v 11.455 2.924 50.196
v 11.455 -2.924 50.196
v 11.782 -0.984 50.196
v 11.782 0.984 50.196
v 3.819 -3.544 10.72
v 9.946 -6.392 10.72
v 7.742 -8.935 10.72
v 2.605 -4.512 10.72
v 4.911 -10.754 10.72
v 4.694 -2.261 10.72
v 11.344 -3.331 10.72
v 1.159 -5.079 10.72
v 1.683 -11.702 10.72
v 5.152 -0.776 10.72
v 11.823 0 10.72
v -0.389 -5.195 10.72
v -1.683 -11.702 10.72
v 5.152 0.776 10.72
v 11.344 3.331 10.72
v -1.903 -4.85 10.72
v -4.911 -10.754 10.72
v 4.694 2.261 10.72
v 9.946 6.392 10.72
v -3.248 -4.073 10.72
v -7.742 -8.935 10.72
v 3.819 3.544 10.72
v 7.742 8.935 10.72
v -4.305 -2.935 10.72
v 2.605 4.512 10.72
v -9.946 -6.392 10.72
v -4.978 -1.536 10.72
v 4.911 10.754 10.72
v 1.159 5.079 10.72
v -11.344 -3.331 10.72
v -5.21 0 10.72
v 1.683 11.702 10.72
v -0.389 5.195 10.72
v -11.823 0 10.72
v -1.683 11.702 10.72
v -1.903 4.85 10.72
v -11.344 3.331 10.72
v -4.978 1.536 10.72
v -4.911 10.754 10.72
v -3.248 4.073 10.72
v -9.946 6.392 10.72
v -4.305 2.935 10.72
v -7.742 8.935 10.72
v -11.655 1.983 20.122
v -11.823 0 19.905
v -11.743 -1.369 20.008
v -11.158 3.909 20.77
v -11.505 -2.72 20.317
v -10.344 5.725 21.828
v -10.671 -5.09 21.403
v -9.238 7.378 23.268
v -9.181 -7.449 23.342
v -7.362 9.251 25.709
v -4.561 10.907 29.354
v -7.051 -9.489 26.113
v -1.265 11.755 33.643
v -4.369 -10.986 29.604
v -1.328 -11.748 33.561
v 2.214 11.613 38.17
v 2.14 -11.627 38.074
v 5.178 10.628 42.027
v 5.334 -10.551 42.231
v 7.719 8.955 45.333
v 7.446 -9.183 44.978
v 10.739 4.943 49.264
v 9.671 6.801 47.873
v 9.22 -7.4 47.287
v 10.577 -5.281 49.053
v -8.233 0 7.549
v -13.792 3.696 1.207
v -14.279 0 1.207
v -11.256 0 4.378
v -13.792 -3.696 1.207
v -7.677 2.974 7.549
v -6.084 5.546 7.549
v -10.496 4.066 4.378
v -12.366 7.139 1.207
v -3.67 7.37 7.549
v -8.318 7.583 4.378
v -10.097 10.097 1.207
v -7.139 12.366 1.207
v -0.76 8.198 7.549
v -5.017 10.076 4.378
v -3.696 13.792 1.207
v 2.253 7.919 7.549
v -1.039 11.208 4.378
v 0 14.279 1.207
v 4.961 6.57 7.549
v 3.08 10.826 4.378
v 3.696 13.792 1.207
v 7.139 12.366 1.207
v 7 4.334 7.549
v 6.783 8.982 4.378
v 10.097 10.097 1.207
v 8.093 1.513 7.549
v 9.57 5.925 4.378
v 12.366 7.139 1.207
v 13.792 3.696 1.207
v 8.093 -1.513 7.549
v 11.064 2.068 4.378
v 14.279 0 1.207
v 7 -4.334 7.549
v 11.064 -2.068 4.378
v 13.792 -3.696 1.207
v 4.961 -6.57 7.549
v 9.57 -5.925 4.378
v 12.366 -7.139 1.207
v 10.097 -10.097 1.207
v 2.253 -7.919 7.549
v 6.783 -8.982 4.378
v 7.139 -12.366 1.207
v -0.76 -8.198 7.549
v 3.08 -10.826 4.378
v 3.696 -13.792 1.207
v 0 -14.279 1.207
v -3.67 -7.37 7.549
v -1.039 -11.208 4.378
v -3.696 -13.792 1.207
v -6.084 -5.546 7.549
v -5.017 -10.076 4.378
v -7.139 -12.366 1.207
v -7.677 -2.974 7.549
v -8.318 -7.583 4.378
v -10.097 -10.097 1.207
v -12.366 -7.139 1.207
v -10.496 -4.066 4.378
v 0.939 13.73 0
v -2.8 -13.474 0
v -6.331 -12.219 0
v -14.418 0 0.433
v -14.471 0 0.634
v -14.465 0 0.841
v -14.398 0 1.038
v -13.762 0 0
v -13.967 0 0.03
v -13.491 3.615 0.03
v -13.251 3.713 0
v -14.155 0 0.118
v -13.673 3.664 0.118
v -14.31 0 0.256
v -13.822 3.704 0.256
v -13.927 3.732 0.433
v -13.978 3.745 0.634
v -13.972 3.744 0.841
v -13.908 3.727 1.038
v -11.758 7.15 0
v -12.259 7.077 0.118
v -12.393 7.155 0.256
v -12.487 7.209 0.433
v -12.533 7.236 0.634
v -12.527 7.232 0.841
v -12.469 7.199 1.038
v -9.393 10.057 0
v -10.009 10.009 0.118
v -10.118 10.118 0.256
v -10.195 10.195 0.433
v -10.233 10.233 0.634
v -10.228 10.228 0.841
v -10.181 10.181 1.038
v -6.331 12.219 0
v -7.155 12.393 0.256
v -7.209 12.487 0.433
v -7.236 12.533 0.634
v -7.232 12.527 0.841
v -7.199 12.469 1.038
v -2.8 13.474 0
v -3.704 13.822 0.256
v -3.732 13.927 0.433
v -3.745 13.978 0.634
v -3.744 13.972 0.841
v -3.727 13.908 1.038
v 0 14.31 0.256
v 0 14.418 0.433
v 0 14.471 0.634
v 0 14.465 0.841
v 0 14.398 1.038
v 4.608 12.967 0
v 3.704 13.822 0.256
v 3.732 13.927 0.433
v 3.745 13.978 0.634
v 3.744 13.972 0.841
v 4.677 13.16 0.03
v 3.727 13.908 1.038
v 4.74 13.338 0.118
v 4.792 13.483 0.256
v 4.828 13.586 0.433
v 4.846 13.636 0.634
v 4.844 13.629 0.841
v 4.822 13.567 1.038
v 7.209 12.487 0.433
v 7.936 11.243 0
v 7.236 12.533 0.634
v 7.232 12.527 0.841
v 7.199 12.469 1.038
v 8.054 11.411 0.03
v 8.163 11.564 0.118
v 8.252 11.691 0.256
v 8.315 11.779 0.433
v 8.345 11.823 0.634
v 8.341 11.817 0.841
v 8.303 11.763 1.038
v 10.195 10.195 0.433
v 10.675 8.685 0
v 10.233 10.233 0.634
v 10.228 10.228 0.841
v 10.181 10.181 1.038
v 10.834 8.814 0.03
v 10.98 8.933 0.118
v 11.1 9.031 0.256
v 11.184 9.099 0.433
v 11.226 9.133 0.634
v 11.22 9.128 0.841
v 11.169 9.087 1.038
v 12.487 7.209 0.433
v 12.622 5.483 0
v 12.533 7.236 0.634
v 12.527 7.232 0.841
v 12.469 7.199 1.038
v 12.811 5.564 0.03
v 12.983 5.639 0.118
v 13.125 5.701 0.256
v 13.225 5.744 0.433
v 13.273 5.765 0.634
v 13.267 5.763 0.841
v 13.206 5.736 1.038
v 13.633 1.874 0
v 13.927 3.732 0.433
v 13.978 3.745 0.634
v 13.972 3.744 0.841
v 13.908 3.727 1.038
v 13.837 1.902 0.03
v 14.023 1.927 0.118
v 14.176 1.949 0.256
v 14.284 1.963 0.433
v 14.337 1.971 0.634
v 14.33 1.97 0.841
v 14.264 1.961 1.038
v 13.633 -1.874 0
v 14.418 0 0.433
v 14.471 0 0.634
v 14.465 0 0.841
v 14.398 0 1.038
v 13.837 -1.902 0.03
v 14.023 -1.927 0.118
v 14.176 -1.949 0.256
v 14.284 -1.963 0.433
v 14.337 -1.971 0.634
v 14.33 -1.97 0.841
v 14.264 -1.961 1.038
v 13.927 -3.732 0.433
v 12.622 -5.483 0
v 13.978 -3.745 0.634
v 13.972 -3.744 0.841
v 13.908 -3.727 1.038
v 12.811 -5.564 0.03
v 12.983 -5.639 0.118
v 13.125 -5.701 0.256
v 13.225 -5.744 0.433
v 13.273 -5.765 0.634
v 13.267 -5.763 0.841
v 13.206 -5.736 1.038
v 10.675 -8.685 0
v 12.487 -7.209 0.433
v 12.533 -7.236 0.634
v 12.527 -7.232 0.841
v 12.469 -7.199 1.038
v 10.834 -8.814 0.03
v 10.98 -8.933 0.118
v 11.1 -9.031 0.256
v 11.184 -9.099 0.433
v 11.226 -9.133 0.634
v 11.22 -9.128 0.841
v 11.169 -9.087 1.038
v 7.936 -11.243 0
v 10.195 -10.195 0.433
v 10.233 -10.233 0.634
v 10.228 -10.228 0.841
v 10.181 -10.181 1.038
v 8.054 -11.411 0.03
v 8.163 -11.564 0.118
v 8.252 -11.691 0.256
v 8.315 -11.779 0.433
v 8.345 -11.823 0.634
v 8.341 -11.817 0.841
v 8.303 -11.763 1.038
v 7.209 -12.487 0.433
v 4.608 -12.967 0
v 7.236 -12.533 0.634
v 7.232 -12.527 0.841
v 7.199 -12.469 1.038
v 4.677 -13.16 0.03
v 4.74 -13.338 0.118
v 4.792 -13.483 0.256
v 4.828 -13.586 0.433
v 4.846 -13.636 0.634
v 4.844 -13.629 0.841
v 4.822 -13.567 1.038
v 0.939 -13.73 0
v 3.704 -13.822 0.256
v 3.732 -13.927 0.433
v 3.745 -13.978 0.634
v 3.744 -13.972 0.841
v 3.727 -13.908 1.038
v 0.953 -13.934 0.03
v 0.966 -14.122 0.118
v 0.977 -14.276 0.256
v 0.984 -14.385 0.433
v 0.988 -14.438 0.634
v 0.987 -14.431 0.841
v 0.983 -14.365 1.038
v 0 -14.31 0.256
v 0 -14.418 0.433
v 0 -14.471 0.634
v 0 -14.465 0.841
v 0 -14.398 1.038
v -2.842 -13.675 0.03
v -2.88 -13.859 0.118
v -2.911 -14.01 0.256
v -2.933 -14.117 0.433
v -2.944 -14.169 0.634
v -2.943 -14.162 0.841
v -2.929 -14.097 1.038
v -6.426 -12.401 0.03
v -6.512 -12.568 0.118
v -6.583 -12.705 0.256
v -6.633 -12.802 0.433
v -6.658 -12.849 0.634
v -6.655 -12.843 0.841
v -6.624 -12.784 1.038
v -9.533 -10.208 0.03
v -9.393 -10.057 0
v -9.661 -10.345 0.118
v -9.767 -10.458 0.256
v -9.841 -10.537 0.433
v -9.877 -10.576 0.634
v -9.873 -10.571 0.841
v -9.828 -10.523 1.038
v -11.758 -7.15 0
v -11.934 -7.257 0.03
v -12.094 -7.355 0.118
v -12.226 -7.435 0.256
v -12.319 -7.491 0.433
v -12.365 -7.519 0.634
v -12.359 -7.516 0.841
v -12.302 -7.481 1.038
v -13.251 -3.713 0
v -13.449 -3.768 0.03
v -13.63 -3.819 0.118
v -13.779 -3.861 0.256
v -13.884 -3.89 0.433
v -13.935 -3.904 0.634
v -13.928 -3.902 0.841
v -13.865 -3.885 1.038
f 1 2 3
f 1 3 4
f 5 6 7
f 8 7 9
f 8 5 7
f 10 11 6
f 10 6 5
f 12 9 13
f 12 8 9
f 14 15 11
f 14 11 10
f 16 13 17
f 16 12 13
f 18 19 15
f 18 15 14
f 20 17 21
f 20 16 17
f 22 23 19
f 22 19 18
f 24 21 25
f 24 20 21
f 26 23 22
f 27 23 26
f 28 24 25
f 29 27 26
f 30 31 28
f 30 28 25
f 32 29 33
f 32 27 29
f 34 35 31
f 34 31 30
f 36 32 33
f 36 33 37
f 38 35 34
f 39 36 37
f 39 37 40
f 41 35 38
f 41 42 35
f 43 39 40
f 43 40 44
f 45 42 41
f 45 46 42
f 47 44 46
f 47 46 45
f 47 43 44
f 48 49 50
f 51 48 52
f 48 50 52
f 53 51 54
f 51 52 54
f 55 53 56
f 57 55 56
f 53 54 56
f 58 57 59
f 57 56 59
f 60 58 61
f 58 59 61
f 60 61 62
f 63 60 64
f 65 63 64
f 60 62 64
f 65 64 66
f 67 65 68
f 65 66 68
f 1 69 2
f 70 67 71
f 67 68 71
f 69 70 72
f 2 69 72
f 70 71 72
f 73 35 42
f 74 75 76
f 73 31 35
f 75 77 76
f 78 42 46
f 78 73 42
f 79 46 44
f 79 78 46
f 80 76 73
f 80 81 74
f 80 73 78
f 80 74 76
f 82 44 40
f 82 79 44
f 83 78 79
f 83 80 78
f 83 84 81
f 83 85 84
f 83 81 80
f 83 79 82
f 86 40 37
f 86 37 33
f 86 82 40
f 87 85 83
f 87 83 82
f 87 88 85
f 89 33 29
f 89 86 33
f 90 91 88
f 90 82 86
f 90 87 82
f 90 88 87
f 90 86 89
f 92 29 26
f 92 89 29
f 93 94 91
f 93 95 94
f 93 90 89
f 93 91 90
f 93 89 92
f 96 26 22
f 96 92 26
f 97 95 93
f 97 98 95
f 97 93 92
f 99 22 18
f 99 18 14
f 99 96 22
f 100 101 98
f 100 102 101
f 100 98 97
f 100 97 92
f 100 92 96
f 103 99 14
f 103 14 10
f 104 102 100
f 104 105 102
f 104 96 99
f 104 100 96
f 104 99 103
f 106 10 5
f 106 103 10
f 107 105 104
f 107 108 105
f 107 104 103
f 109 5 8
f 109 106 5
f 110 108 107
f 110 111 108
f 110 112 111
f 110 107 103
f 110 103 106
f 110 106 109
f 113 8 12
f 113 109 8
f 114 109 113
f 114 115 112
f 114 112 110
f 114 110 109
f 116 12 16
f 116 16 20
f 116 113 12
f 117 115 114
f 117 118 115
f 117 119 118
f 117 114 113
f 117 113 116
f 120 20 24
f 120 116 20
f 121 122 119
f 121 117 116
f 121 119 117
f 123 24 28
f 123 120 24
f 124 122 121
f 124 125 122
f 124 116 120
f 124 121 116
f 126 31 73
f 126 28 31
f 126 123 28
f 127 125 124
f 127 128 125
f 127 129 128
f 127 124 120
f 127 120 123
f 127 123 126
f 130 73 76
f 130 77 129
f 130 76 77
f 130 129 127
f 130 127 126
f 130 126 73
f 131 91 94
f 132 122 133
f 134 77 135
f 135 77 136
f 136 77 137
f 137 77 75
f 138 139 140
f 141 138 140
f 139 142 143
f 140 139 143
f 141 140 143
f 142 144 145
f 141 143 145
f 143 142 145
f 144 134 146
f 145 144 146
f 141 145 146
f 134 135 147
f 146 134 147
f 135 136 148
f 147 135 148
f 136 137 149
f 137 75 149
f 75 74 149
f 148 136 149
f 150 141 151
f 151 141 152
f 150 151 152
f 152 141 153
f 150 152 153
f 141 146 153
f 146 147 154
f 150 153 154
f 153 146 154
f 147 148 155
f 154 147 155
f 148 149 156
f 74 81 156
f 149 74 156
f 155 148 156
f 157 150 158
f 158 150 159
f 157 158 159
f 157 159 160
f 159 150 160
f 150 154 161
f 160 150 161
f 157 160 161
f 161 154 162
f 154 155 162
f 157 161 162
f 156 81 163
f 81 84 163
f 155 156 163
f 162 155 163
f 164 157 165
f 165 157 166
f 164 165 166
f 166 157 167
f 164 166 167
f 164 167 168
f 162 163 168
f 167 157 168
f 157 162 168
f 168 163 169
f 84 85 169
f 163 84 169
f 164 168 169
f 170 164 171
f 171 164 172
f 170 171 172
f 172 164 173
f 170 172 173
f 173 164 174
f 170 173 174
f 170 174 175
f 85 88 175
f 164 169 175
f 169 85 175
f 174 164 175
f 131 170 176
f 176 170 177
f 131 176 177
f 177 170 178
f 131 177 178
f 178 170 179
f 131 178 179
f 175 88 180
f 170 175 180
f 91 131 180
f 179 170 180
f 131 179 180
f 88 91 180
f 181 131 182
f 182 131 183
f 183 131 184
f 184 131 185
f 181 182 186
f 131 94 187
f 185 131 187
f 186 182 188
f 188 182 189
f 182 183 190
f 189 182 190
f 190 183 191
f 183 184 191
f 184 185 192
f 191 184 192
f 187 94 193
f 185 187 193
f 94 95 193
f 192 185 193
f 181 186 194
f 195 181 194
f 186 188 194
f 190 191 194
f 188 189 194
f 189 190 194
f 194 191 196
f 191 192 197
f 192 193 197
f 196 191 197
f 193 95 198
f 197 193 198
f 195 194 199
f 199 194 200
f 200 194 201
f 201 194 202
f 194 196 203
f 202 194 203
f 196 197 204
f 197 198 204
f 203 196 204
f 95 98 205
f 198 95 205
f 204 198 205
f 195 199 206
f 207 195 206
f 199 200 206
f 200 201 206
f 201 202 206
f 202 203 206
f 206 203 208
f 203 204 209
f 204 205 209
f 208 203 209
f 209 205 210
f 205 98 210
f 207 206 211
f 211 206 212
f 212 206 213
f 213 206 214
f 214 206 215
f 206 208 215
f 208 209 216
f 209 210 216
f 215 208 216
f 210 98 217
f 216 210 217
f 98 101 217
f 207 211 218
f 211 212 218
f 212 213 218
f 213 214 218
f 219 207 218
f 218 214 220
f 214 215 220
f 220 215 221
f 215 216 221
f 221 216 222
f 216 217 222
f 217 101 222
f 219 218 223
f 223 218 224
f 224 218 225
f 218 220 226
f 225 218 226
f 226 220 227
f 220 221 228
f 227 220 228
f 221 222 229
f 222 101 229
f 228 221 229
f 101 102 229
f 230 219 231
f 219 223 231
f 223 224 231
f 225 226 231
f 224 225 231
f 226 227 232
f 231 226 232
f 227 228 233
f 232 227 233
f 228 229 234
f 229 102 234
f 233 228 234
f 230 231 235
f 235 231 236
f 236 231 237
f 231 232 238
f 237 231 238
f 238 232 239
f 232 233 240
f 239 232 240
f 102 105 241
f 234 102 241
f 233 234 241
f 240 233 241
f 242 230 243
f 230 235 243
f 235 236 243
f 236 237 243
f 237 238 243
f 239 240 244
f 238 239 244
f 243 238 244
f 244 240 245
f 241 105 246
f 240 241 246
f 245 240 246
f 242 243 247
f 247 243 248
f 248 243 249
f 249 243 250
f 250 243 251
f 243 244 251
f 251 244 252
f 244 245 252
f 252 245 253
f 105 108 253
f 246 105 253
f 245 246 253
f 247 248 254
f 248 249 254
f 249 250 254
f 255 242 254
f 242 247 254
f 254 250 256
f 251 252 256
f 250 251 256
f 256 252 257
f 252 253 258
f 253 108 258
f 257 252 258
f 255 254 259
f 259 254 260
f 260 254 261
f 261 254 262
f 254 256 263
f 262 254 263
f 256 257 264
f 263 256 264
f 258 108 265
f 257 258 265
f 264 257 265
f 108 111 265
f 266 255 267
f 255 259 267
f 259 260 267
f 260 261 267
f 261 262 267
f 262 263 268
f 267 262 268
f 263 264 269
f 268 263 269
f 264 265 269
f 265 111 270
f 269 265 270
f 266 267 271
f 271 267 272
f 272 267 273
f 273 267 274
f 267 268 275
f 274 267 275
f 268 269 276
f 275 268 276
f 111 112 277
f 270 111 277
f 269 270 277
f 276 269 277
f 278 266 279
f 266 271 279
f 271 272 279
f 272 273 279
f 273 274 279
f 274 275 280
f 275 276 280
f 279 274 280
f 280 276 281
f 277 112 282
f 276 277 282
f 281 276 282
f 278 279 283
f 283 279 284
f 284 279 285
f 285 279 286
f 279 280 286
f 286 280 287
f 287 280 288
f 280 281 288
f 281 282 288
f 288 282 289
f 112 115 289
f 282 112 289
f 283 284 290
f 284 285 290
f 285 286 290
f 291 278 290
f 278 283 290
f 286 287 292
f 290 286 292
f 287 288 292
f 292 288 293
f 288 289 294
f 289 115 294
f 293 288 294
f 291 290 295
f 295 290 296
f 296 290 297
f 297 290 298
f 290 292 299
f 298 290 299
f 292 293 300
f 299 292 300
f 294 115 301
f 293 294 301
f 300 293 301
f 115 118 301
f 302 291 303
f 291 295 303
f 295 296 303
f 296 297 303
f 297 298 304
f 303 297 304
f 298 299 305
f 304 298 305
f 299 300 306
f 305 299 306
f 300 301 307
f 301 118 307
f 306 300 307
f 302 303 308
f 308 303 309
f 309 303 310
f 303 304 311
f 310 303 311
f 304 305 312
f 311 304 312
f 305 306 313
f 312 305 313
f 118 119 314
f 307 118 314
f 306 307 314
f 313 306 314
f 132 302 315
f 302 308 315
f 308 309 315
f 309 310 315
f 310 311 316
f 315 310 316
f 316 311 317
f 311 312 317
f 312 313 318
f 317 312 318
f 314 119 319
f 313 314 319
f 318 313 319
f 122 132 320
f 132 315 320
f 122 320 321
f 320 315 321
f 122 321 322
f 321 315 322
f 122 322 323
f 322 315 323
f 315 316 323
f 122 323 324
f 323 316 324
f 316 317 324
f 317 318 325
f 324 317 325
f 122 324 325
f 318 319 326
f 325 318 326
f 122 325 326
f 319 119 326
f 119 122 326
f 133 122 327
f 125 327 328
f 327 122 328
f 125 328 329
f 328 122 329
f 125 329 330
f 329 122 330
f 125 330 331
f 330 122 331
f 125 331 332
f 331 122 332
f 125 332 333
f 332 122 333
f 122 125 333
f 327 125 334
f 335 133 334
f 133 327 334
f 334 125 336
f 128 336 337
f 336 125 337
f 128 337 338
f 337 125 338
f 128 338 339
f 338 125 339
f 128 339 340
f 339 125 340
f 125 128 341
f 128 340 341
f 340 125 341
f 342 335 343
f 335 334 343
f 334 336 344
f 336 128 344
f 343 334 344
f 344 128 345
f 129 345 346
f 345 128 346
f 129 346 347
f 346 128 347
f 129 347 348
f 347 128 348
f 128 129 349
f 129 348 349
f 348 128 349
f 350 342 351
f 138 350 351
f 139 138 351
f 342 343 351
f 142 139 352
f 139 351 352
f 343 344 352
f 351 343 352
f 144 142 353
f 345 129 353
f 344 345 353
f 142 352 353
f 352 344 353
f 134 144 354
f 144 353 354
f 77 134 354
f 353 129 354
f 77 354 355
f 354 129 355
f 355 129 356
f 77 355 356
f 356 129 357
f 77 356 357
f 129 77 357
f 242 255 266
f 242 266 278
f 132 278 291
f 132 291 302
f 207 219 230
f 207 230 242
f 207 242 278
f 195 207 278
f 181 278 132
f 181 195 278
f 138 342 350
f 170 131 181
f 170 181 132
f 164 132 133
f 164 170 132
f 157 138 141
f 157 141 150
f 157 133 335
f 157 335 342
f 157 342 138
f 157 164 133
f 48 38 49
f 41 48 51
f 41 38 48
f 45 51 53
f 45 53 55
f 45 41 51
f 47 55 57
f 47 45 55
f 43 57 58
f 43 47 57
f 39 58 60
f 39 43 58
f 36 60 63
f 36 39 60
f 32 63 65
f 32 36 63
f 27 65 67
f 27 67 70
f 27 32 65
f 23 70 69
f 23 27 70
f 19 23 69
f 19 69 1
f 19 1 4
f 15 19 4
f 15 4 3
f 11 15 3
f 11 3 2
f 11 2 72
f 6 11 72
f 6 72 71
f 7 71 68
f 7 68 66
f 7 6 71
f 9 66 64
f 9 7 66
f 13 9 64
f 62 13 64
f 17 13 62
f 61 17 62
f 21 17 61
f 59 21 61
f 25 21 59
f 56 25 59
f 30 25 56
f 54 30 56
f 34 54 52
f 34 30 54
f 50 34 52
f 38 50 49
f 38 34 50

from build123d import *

# Parameters (mm, degrees)
F3_DEPTH = 18.7
F4_R     = 0.714298


with BuildPart() as f1:
    # F0 (on Front) → F1 (revolve)
    with BuildSketch(Plane.XZ):
        Polygon((-15.42939, 0), (0, 0), (0, 50.195612), (-11.82252, 50.195612), (-11.82252, 10.720421), (-5.209924, 10.720421), align=None)
    revolve(axis=Axis((0, 0, 25.097806), (0, 0, -1)))

    # F2 (on Front) → F3 (cut, symmetric)
    with BuildSketch(Plane.XZ):
        Polygon((-17.032443, 13.125001), (14.227101, 53.802483), (-17.032443, 55.806302), align=None)
    extrude(amount=F3_DEPTH, both=True, mode=Mode.SUBTRACT)

    # F4
    f4_edges = [f1.edges().sort_by_distance(p)[0] for p in [
        (15.42939, 0, 0),
    ]]
    fillet(f4_edges, radius=F4_R)


solid = f1.part
